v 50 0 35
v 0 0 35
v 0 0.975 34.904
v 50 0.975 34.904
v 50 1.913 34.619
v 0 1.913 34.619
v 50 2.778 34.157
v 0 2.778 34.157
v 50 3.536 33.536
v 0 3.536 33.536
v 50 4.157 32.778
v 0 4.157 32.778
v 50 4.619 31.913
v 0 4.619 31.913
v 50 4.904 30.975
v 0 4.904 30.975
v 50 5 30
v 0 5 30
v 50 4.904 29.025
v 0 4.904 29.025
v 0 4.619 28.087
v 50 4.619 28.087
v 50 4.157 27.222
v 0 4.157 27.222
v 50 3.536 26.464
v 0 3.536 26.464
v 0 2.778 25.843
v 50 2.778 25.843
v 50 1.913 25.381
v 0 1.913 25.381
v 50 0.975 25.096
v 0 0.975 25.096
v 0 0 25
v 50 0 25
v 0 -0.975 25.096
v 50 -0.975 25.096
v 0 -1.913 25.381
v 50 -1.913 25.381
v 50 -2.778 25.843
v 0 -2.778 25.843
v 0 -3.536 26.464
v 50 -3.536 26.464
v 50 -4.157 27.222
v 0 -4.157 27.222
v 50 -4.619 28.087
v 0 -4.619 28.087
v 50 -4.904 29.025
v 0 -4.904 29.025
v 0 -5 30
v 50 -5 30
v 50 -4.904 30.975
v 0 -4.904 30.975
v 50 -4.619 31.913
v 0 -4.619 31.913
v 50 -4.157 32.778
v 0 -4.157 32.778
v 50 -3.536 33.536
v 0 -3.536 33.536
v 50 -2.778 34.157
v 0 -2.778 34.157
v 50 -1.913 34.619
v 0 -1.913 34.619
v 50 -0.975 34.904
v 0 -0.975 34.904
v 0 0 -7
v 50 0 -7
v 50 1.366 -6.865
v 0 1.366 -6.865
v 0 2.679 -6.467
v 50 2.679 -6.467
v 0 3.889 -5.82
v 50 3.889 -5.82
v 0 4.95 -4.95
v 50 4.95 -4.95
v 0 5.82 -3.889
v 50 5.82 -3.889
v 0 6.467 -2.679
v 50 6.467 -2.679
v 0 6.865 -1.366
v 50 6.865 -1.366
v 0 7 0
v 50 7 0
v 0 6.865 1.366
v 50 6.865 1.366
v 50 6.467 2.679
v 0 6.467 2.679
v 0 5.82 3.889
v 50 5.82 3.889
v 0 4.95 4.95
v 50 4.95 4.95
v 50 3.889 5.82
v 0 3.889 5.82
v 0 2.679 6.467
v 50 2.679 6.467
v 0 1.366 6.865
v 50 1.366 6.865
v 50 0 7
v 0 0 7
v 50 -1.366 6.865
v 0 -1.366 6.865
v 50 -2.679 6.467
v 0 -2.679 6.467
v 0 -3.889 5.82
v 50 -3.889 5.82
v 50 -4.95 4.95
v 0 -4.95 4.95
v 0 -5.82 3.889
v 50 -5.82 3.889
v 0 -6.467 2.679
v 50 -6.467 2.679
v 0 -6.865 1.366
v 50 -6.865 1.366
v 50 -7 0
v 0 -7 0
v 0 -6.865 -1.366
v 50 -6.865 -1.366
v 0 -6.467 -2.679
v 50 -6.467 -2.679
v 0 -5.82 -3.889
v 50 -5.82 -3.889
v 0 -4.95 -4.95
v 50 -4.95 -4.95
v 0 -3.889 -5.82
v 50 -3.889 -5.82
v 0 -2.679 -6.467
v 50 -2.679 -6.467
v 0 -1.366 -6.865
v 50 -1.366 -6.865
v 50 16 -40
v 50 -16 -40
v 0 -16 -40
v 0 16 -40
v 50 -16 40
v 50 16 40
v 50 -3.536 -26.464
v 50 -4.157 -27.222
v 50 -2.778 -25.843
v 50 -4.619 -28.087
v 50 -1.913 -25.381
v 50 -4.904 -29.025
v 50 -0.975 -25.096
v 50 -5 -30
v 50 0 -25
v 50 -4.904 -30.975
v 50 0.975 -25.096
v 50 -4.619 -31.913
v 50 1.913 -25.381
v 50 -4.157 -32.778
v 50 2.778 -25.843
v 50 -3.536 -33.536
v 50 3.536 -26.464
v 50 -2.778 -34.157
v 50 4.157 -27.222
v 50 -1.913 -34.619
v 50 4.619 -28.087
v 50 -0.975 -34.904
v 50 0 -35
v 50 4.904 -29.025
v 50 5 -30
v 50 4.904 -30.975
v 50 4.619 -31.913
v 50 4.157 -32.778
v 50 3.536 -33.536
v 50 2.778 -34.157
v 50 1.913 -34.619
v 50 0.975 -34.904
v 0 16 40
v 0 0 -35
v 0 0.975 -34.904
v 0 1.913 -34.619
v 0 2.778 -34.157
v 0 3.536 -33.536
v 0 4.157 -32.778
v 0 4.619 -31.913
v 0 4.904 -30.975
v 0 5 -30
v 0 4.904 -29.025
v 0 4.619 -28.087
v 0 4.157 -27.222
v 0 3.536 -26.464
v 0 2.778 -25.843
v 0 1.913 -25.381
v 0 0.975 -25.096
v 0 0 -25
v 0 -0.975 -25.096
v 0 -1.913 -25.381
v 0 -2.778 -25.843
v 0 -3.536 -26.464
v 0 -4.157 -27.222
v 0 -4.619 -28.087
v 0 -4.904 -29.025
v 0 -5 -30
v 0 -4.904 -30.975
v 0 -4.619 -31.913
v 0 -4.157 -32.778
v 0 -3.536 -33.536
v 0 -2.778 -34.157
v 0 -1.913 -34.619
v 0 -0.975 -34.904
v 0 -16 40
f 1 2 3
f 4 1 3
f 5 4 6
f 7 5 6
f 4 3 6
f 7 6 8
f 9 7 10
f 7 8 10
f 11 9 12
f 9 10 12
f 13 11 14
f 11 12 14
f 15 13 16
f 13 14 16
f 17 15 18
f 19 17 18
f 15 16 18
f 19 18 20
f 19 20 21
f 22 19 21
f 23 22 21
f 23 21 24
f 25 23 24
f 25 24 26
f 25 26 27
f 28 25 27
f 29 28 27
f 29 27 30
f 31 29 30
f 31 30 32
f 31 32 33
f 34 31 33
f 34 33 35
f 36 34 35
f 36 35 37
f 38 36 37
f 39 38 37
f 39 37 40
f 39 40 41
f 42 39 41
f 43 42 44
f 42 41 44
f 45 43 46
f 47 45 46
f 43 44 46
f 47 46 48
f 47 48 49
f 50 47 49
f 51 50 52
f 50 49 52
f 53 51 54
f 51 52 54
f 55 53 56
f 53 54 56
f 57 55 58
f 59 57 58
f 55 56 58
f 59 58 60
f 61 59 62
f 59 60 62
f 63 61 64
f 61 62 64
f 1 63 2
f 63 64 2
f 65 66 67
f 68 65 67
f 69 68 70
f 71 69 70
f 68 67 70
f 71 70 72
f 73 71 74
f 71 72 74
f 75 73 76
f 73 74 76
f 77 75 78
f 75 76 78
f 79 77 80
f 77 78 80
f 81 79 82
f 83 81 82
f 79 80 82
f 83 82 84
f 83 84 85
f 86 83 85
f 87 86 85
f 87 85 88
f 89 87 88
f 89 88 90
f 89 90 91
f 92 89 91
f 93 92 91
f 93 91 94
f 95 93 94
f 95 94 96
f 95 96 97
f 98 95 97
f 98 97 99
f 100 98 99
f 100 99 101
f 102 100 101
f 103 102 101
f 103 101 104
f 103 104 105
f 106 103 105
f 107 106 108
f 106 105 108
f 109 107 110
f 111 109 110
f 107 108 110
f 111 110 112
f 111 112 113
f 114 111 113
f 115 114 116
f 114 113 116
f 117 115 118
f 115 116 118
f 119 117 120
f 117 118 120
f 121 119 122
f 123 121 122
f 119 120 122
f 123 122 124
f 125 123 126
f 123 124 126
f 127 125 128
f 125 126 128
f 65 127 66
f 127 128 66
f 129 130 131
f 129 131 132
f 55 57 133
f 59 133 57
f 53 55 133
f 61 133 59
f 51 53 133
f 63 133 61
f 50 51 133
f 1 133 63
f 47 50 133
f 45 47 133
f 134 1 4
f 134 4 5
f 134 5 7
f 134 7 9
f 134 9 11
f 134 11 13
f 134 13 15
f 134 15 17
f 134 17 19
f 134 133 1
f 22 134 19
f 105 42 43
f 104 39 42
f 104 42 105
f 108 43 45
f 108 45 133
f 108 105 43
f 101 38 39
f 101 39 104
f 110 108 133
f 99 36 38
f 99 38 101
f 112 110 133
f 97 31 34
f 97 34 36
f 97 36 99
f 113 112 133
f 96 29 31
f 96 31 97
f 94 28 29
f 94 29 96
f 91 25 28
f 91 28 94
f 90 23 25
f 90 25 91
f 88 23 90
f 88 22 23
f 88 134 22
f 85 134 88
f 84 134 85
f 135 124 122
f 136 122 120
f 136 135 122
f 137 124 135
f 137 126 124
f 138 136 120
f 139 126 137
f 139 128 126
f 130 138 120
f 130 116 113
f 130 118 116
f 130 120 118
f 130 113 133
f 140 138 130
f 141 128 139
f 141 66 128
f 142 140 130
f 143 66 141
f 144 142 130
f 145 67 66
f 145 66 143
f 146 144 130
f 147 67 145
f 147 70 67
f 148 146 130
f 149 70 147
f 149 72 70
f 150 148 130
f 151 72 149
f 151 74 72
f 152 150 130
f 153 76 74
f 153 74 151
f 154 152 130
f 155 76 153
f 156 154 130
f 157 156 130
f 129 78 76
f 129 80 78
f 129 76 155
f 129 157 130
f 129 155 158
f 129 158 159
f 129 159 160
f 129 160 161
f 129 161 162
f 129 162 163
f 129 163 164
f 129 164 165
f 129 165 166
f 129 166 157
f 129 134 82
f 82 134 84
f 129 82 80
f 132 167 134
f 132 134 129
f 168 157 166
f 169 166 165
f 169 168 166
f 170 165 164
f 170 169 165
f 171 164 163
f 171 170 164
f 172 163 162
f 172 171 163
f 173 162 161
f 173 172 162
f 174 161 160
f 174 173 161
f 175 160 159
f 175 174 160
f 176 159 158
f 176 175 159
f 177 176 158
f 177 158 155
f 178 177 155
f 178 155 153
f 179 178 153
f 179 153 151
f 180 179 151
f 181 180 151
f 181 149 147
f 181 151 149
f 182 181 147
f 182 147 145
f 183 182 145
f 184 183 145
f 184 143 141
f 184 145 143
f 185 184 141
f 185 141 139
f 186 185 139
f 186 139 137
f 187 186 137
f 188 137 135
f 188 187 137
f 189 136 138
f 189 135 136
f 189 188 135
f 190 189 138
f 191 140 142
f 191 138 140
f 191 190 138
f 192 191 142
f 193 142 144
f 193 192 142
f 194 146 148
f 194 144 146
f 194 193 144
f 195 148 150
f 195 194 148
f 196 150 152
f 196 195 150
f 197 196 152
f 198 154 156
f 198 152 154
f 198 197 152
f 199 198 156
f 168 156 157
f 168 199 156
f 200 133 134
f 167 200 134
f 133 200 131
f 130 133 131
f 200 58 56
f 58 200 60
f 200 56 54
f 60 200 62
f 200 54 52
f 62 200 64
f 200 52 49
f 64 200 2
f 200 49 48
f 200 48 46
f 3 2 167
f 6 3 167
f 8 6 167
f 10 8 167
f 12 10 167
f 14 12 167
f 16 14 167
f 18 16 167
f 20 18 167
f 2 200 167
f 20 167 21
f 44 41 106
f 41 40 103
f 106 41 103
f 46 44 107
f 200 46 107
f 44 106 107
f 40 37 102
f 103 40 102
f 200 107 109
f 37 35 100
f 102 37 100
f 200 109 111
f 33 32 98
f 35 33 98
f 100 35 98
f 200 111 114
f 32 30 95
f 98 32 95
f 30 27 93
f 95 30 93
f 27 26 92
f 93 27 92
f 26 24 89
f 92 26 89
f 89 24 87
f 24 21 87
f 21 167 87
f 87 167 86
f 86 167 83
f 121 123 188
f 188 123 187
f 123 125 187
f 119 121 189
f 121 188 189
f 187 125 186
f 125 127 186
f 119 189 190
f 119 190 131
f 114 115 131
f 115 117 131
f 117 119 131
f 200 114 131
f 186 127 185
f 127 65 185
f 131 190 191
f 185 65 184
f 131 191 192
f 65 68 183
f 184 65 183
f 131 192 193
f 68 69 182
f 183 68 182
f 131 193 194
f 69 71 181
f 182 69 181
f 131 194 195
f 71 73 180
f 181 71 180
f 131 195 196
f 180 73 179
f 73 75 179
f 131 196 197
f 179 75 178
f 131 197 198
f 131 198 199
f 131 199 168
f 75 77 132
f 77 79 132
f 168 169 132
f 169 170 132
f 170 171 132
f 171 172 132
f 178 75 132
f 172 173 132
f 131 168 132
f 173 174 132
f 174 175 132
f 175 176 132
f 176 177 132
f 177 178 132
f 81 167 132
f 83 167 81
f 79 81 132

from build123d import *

# Parameters (mm, degrees)
SKETCH_1_W          = 80
SKETCH_1_H          = 32
EXTRUDE_1_DEPTH     = 50
HOLE_WIZARD_M16_1_D = 14
SKETCH_5_R          = 5
CUT_EXTRUDE_1_DEPTH = 67


with BuildPart() as part:
    # 草图1 → 凸台-拉伸1 (new body)
    with BuildSketch(Plane(origin=(0, 0, 0), x_dir=(0, 0, -1), z_dir=(1, 0, 0))):
        Rectangle(SKETCH_1_W, SKETCH_1_H)
    extrude(amount=EXTRUDE_1_DEPTH)

    # M16 螺纹孔1 (through all)
    with Locations(Plane.ZY):
        with Locations((0, 0)):
            Hole(HOLE_WIZARD_M16_1_D / 2)

    # 草图5 → 切除-拉伸1 (cut, through all)
    with BuildSketch(Plane.ZY):
        with Locations((30, 0)):
            Circle(SKETCH_5_R)
    cut_extrude_1 = extrude(amount=-CUT_EXTRUDE_1_DEPTH, mode=Mode.SUBTRACT)

    # 镜向1: 切除-拉伸1 across plane
    add(cut_extrude_1.mirror(Plane.XY), mode=Mode.SUBTRACT)


solid = part.part
